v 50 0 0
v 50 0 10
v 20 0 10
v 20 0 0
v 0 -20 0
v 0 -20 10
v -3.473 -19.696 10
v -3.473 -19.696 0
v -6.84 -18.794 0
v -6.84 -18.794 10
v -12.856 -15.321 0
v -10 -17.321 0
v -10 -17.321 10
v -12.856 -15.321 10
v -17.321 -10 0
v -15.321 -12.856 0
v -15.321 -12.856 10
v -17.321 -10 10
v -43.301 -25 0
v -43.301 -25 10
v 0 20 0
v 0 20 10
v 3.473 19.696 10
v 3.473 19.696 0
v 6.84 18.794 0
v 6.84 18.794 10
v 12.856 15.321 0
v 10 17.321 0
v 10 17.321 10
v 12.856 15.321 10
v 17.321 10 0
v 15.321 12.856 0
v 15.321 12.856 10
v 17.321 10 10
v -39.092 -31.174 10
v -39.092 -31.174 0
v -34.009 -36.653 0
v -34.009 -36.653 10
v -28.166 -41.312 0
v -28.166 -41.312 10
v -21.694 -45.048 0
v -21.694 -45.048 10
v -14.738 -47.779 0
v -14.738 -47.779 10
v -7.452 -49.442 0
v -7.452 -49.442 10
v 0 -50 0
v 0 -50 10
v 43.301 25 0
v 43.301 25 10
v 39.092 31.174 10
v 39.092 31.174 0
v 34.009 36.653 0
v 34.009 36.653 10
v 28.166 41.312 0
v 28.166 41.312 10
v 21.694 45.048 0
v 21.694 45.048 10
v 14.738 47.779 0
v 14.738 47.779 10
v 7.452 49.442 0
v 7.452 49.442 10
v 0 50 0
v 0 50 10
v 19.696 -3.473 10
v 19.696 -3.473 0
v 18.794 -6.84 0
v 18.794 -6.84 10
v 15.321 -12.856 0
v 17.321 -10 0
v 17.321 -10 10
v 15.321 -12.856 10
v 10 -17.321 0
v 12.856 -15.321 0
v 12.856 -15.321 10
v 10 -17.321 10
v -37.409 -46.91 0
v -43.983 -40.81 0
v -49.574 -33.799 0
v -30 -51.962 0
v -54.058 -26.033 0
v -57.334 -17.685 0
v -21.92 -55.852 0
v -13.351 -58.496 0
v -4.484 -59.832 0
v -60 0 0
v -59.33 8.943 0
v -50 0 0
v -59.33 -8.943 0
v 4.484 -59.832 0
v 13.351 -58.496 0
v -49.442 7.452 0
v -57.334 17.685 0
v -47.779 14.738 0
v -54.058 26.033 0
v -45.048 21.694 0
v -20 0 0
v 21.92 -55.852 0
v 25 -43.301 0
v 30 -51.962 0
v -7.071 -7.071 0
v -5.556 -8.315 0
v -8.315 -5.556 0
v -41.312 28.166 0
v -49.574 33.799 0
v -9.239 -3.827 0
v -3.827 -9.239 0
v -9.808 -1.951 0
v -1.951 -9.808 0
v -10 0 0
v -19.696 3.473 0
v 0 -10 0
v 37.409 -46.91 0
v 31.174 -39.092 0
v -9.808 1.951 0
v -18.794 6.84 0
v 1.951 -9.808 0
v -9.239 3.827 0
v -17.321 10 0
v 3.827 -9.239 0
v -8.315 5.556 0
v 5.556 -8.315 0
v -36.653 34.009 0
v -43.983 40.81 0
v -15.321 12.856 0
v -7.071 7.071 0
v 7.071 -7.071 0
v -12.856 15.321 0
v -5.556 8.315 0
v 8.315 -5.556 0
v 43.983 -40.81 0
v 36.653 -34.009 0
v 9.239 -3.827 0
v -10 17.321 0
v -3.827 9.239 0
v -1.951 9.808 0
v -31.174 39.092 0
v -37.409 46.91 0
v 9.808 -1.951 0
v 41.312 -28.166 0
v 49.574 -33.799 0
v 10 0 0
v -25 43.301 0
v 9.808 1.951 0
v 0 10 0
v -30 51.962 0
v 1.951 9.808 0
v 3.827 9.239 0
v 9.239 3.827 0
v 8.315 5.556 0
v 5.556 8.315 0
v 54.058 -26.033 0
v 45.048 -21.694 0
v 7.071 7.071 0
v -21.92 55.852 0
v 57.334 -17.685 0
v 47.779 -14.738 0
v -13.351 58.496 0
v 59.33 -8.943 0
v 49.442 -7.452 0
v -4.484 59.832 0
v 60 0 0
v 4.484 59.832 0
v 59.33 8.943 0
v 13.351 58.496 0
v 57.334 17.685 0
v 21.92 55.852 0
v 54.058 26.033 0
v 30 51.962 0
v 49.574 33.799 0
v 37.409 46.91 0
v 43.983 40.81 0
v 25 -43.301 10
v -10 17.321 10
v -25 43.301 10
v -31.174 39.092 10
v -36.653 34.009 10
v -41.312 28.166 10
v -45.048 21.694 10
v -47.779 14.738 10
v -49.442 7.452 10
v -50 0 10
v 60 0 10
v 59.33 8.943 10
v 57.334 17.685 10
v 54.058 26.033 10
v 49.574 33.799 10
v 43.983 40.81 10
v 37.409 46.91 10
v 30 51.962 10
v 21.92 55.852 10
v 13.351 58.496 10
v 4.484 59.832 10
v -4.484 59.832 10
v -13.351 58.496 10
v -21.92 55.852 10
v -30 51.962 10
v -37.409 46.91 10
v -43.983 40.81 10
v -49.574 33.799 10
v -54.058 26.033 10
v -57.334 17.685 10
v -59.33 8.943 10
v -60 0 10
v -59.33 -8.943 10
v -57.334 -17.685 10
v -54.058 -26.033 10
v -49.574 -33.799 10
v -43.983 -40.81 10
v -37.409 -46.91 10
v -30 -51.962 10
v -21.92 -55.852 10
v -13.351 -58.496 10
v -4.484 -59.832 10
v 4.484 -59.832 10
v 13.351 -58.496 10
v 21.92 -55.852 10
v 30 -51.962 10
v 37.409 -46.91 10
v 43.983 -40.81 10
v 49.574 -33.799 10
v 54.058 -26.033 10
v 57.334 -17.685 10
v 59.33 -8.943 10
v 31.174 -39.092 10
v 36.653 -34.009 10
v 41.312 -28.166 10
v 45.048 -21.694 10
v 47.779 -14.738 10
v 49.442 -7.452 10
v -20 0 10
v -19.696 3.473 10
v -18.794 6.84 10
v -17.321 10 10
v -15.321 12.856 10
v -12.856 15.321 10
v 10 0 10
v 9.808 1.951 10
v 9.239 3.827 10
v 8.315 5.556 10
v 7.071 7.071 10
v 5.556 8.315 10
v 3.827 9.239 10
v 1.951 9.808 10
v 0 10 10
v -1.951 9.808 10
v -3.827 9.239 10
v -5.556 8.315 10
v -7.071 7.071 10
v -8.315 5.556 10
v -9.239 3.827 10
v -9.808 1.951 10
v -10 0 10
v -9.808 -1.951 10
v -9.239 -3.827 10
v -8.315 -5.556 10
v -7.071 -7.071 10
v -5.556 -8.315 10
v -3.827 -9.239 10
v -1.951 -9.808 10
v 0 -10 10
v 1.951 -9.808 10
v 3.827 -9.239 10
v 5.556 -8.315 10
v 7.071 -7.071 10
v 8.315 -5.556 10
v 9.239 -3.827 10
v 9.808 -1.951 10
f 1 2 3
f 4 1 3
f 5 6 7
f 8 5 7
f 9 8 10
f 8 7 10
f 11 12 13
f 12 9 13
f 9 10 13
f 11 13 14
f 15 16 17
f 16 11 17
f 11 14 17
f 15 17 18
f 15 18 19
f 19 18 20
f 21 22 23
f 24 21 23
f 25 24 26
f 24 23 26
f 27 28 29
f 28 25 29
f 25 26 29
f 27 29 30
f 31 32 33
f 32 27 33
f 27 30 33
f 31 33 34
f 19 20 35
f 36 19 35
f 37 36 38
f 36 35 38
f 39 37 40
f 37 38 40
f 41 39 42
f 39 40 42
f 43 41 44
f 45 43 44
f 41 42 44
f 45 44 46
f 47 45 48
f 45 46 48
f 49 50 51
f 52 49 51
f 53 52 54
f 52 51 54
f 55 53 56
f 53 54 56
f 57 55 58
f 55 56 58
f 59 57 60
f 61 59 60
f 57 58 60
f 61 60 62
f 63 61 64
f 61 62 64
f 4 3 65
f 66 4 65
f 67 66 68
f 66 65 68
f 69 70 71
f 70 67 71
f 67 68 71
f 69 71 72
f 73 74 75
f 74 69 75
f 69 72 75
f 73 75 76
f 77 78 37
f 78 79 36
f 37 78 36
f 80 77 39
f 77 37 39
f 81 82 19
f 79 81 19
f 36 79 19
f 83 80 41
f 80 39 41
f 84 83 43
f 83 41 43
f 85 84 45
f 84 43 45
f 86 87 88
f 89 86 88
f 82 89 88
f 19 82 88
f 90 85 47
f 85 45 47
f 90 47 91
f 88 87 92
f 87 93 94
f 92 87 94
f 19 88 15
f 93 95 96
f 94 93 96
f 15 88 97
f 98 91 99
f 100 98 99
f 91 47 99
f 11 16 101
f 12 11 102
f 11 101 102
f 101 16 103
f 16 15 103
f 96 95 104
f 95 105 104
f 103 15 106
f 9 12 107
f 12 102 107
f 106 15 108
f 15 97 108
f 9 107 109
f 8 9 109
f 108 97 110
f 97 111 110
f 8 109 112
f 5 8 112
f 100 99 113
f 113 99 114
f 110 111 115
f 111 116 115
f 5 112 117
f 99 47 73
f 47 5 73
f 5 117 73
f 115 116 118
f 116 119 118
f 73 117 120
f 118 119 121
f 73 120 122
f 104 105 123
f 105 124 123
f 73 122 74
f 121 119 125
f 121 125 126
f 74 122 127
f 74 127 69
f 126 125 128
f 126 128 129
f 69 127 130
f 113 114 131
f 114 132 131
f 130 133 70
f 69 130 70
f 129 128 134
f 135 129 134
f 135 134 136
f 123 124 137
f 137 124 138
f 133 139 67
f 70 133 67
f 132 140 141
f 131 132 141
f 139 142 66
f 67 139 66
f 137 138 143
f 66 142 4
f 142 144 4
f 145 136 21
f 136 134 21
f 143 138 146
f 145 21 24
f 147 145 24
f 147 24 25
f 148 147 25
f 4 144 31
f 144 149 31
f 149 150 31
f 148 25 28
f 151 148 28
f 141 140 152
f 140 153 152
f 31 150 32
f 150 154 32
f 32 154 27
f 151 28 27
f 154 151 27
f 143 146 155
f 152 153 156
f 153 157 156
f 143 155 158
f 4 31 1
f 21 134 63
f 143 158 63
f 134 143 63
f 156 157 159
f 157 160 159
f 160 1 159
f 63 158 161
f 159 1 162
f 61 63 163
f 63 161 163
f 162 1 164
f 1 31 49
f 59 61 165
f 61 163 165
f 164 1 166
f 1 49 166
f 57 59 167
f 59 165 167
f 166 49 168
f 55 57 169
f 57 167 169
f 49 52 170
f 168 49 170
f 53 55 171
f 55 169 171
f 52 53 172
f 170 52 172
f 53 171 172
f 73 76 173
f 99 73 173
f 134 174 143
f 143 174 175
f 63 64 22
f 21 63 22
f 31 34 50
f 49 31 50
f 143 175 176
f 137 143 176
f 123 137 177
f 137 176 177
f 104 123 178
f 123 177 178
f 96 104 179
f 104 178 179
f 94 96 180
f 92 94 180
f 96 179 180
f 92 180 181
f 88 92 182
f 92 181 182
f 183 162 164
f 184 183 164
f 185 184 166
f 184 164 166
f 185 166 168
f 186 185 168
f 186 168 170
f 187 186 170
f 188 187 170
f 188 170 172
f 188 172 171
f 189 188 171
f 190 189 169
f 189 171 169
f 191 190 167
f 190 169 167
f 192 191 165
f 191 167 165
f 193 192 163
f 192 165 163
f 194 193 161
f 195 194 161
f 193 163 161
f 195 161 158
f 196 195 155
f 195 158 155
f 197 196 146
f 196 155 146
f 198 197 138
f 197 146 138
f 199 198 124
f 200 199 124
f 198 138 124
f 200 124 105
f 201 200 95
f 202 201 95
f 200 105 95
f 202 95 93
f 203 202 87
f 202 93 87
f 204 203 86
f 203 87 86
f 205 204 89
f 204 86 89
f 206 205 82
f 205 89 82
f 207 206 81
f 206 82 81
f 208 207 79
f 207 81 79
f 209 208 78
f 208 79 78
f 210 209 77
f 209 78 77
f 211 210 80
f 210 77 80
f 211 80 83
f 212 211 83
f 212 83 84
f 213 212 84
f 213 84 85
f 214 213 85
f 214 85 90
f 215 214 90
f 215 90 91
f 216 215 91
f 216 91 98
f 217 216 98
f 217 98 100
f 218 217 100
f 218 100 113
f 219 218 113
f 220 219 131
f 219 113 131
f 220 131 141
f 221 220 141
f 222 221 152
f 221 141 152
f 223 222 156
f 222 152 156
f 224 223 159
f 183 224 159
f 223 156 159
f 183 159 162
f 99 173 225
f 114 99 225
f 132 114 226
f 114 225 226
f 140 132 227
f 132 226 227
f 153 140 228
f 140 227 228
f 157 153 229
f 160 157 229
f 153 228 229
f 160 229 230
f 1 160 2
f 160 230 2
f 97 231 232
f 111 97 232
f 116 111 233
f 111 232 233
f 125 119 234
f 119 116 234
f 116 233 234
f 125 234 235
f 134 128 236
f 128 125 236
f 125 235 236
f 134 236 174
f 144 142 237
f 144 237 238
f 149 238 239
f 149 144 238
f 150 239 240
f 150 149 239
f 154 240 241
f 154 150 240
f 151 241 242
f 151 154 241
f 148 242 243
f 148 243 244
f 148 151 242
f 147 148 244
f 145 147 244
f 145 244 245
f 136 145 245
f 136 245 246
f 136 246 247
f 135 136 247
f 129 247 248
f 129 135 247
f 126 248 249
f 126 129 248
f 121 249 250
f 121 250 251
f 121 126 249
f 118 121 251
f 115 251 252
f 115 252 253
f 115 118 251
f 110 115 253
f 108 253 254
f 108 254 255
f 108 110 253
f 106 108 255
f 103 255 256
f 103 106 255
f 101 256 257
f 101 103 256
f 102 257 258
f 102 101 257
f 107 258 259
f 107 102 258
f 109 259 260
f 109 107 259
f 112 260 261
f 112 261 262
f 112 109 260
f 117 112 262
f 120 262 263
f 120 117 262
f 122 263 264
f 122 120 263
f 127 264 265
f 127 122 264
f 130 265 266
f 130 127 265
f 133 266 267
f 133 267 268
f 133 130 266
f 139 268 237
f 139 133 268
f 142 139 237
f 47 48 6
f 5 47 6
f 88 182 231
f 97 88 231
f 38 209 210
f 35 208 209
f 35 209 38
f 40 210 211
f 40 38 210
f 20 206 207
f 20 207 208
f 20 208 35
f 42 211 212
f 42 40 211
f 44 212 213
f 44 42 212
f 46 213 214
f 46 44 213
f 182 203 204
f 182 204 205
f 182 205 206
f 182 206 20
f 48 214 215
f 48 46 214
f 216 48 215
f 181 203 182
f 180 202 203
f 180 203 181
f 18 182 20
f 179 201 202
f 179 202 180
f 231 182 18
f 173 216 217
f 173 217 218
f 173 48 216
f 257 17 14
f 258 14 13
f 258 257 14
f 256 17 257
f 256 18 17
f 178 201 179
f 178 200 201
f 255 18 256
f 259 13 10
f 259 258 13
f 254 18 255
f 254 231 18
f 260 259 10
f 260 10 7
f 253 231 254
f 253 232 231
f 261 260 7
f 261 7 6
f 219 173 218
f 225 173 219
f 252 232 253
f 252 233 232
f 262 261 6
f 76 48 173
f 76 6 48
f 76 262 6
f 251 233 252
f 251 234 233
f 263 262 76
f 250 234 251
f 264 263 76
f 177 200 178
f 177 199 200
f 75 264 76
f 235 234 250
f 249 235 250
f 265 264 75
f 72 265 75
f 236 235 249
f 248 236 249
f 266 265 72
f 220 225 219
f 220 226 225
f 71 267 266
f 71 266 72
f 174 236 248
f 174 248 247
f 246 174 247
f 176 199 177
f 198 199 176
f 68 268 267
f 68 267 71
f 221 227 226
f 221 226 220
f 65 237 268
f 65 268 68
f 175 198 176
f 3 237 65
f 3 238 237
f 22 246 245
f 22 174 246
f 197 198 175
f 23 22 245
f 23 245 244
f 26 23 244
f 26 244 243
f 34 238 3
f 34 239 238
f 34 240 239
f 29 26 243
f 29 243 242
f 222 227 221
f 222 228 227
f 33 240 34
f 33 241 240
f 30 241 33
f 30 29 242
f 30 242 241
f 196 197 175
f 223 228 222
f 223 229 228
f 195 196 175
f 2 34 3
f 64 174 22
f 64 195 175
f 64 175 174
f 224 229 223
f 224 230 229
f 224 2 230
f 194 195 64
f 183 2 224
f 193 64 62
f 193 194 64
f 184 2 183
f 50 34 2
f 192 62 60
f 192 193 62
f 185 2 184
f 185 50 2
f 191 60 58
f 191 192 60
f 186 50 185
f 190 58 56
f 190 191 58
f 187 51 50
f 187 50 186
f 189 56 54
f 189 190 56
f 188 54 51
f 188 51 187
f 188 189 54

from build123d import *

# Parameters (mm, degrees)
SKETCH_1_R               = 60
SKETCH_1_R_2             = 10
EXTRUDE_1_DEPTH          = 10
CUT_EXTRUDE_1_DEPTH      = 121
PATTERN_CIRCULAR_1_COUNT = 4


with BuildPart() as part:
    # 草图1 → 凸台-拉伸1 (new body)
    with BuildSketch(Plane.XY):
        Circle(SKETCH_1_R)
        Circle(SKETCH_1_R_2, mode=Mode.SUBTRACT)
    extrude(amount=EXTRUDE_1_DEPTH)

    # 草图2 → 切除-拉伸1 (cut, symmetric)
    with BuildSketch(Plane.XY):
        with BuildLine():
            Line((0, 50), (0, 20))
            ThreePointArc((0, 20), (10, 17.320508076), (17.320508076, 10))
            Line((17.320508076, 10), (43.301270189, 25))
            ThreePointArc((43.301270189, 25), (25, 43.301270189), (0, 50))
        make_face()
    cut_extrude_1 = extrude(amount=CUT_EXTRUDE_1_DEPTH, both=True, mode=Mode.SUBTRACT)

    # 阵列(圆周)1: 切除-拉伸1 ×4 about axis
    pattern_circular_1_axis = Axis((0, 0, 10.5), (0, 0, -1))
    for i in range(1, PATTERN_CIRCULAR_1_COUNT):
        add(cut_extrude_1.rotate(pattern_circular_1_axis, i * 360 / PATTERN_CIRCULAR_1_COUNT), mode=Mode.SUBTRACT)


solid = part.part
